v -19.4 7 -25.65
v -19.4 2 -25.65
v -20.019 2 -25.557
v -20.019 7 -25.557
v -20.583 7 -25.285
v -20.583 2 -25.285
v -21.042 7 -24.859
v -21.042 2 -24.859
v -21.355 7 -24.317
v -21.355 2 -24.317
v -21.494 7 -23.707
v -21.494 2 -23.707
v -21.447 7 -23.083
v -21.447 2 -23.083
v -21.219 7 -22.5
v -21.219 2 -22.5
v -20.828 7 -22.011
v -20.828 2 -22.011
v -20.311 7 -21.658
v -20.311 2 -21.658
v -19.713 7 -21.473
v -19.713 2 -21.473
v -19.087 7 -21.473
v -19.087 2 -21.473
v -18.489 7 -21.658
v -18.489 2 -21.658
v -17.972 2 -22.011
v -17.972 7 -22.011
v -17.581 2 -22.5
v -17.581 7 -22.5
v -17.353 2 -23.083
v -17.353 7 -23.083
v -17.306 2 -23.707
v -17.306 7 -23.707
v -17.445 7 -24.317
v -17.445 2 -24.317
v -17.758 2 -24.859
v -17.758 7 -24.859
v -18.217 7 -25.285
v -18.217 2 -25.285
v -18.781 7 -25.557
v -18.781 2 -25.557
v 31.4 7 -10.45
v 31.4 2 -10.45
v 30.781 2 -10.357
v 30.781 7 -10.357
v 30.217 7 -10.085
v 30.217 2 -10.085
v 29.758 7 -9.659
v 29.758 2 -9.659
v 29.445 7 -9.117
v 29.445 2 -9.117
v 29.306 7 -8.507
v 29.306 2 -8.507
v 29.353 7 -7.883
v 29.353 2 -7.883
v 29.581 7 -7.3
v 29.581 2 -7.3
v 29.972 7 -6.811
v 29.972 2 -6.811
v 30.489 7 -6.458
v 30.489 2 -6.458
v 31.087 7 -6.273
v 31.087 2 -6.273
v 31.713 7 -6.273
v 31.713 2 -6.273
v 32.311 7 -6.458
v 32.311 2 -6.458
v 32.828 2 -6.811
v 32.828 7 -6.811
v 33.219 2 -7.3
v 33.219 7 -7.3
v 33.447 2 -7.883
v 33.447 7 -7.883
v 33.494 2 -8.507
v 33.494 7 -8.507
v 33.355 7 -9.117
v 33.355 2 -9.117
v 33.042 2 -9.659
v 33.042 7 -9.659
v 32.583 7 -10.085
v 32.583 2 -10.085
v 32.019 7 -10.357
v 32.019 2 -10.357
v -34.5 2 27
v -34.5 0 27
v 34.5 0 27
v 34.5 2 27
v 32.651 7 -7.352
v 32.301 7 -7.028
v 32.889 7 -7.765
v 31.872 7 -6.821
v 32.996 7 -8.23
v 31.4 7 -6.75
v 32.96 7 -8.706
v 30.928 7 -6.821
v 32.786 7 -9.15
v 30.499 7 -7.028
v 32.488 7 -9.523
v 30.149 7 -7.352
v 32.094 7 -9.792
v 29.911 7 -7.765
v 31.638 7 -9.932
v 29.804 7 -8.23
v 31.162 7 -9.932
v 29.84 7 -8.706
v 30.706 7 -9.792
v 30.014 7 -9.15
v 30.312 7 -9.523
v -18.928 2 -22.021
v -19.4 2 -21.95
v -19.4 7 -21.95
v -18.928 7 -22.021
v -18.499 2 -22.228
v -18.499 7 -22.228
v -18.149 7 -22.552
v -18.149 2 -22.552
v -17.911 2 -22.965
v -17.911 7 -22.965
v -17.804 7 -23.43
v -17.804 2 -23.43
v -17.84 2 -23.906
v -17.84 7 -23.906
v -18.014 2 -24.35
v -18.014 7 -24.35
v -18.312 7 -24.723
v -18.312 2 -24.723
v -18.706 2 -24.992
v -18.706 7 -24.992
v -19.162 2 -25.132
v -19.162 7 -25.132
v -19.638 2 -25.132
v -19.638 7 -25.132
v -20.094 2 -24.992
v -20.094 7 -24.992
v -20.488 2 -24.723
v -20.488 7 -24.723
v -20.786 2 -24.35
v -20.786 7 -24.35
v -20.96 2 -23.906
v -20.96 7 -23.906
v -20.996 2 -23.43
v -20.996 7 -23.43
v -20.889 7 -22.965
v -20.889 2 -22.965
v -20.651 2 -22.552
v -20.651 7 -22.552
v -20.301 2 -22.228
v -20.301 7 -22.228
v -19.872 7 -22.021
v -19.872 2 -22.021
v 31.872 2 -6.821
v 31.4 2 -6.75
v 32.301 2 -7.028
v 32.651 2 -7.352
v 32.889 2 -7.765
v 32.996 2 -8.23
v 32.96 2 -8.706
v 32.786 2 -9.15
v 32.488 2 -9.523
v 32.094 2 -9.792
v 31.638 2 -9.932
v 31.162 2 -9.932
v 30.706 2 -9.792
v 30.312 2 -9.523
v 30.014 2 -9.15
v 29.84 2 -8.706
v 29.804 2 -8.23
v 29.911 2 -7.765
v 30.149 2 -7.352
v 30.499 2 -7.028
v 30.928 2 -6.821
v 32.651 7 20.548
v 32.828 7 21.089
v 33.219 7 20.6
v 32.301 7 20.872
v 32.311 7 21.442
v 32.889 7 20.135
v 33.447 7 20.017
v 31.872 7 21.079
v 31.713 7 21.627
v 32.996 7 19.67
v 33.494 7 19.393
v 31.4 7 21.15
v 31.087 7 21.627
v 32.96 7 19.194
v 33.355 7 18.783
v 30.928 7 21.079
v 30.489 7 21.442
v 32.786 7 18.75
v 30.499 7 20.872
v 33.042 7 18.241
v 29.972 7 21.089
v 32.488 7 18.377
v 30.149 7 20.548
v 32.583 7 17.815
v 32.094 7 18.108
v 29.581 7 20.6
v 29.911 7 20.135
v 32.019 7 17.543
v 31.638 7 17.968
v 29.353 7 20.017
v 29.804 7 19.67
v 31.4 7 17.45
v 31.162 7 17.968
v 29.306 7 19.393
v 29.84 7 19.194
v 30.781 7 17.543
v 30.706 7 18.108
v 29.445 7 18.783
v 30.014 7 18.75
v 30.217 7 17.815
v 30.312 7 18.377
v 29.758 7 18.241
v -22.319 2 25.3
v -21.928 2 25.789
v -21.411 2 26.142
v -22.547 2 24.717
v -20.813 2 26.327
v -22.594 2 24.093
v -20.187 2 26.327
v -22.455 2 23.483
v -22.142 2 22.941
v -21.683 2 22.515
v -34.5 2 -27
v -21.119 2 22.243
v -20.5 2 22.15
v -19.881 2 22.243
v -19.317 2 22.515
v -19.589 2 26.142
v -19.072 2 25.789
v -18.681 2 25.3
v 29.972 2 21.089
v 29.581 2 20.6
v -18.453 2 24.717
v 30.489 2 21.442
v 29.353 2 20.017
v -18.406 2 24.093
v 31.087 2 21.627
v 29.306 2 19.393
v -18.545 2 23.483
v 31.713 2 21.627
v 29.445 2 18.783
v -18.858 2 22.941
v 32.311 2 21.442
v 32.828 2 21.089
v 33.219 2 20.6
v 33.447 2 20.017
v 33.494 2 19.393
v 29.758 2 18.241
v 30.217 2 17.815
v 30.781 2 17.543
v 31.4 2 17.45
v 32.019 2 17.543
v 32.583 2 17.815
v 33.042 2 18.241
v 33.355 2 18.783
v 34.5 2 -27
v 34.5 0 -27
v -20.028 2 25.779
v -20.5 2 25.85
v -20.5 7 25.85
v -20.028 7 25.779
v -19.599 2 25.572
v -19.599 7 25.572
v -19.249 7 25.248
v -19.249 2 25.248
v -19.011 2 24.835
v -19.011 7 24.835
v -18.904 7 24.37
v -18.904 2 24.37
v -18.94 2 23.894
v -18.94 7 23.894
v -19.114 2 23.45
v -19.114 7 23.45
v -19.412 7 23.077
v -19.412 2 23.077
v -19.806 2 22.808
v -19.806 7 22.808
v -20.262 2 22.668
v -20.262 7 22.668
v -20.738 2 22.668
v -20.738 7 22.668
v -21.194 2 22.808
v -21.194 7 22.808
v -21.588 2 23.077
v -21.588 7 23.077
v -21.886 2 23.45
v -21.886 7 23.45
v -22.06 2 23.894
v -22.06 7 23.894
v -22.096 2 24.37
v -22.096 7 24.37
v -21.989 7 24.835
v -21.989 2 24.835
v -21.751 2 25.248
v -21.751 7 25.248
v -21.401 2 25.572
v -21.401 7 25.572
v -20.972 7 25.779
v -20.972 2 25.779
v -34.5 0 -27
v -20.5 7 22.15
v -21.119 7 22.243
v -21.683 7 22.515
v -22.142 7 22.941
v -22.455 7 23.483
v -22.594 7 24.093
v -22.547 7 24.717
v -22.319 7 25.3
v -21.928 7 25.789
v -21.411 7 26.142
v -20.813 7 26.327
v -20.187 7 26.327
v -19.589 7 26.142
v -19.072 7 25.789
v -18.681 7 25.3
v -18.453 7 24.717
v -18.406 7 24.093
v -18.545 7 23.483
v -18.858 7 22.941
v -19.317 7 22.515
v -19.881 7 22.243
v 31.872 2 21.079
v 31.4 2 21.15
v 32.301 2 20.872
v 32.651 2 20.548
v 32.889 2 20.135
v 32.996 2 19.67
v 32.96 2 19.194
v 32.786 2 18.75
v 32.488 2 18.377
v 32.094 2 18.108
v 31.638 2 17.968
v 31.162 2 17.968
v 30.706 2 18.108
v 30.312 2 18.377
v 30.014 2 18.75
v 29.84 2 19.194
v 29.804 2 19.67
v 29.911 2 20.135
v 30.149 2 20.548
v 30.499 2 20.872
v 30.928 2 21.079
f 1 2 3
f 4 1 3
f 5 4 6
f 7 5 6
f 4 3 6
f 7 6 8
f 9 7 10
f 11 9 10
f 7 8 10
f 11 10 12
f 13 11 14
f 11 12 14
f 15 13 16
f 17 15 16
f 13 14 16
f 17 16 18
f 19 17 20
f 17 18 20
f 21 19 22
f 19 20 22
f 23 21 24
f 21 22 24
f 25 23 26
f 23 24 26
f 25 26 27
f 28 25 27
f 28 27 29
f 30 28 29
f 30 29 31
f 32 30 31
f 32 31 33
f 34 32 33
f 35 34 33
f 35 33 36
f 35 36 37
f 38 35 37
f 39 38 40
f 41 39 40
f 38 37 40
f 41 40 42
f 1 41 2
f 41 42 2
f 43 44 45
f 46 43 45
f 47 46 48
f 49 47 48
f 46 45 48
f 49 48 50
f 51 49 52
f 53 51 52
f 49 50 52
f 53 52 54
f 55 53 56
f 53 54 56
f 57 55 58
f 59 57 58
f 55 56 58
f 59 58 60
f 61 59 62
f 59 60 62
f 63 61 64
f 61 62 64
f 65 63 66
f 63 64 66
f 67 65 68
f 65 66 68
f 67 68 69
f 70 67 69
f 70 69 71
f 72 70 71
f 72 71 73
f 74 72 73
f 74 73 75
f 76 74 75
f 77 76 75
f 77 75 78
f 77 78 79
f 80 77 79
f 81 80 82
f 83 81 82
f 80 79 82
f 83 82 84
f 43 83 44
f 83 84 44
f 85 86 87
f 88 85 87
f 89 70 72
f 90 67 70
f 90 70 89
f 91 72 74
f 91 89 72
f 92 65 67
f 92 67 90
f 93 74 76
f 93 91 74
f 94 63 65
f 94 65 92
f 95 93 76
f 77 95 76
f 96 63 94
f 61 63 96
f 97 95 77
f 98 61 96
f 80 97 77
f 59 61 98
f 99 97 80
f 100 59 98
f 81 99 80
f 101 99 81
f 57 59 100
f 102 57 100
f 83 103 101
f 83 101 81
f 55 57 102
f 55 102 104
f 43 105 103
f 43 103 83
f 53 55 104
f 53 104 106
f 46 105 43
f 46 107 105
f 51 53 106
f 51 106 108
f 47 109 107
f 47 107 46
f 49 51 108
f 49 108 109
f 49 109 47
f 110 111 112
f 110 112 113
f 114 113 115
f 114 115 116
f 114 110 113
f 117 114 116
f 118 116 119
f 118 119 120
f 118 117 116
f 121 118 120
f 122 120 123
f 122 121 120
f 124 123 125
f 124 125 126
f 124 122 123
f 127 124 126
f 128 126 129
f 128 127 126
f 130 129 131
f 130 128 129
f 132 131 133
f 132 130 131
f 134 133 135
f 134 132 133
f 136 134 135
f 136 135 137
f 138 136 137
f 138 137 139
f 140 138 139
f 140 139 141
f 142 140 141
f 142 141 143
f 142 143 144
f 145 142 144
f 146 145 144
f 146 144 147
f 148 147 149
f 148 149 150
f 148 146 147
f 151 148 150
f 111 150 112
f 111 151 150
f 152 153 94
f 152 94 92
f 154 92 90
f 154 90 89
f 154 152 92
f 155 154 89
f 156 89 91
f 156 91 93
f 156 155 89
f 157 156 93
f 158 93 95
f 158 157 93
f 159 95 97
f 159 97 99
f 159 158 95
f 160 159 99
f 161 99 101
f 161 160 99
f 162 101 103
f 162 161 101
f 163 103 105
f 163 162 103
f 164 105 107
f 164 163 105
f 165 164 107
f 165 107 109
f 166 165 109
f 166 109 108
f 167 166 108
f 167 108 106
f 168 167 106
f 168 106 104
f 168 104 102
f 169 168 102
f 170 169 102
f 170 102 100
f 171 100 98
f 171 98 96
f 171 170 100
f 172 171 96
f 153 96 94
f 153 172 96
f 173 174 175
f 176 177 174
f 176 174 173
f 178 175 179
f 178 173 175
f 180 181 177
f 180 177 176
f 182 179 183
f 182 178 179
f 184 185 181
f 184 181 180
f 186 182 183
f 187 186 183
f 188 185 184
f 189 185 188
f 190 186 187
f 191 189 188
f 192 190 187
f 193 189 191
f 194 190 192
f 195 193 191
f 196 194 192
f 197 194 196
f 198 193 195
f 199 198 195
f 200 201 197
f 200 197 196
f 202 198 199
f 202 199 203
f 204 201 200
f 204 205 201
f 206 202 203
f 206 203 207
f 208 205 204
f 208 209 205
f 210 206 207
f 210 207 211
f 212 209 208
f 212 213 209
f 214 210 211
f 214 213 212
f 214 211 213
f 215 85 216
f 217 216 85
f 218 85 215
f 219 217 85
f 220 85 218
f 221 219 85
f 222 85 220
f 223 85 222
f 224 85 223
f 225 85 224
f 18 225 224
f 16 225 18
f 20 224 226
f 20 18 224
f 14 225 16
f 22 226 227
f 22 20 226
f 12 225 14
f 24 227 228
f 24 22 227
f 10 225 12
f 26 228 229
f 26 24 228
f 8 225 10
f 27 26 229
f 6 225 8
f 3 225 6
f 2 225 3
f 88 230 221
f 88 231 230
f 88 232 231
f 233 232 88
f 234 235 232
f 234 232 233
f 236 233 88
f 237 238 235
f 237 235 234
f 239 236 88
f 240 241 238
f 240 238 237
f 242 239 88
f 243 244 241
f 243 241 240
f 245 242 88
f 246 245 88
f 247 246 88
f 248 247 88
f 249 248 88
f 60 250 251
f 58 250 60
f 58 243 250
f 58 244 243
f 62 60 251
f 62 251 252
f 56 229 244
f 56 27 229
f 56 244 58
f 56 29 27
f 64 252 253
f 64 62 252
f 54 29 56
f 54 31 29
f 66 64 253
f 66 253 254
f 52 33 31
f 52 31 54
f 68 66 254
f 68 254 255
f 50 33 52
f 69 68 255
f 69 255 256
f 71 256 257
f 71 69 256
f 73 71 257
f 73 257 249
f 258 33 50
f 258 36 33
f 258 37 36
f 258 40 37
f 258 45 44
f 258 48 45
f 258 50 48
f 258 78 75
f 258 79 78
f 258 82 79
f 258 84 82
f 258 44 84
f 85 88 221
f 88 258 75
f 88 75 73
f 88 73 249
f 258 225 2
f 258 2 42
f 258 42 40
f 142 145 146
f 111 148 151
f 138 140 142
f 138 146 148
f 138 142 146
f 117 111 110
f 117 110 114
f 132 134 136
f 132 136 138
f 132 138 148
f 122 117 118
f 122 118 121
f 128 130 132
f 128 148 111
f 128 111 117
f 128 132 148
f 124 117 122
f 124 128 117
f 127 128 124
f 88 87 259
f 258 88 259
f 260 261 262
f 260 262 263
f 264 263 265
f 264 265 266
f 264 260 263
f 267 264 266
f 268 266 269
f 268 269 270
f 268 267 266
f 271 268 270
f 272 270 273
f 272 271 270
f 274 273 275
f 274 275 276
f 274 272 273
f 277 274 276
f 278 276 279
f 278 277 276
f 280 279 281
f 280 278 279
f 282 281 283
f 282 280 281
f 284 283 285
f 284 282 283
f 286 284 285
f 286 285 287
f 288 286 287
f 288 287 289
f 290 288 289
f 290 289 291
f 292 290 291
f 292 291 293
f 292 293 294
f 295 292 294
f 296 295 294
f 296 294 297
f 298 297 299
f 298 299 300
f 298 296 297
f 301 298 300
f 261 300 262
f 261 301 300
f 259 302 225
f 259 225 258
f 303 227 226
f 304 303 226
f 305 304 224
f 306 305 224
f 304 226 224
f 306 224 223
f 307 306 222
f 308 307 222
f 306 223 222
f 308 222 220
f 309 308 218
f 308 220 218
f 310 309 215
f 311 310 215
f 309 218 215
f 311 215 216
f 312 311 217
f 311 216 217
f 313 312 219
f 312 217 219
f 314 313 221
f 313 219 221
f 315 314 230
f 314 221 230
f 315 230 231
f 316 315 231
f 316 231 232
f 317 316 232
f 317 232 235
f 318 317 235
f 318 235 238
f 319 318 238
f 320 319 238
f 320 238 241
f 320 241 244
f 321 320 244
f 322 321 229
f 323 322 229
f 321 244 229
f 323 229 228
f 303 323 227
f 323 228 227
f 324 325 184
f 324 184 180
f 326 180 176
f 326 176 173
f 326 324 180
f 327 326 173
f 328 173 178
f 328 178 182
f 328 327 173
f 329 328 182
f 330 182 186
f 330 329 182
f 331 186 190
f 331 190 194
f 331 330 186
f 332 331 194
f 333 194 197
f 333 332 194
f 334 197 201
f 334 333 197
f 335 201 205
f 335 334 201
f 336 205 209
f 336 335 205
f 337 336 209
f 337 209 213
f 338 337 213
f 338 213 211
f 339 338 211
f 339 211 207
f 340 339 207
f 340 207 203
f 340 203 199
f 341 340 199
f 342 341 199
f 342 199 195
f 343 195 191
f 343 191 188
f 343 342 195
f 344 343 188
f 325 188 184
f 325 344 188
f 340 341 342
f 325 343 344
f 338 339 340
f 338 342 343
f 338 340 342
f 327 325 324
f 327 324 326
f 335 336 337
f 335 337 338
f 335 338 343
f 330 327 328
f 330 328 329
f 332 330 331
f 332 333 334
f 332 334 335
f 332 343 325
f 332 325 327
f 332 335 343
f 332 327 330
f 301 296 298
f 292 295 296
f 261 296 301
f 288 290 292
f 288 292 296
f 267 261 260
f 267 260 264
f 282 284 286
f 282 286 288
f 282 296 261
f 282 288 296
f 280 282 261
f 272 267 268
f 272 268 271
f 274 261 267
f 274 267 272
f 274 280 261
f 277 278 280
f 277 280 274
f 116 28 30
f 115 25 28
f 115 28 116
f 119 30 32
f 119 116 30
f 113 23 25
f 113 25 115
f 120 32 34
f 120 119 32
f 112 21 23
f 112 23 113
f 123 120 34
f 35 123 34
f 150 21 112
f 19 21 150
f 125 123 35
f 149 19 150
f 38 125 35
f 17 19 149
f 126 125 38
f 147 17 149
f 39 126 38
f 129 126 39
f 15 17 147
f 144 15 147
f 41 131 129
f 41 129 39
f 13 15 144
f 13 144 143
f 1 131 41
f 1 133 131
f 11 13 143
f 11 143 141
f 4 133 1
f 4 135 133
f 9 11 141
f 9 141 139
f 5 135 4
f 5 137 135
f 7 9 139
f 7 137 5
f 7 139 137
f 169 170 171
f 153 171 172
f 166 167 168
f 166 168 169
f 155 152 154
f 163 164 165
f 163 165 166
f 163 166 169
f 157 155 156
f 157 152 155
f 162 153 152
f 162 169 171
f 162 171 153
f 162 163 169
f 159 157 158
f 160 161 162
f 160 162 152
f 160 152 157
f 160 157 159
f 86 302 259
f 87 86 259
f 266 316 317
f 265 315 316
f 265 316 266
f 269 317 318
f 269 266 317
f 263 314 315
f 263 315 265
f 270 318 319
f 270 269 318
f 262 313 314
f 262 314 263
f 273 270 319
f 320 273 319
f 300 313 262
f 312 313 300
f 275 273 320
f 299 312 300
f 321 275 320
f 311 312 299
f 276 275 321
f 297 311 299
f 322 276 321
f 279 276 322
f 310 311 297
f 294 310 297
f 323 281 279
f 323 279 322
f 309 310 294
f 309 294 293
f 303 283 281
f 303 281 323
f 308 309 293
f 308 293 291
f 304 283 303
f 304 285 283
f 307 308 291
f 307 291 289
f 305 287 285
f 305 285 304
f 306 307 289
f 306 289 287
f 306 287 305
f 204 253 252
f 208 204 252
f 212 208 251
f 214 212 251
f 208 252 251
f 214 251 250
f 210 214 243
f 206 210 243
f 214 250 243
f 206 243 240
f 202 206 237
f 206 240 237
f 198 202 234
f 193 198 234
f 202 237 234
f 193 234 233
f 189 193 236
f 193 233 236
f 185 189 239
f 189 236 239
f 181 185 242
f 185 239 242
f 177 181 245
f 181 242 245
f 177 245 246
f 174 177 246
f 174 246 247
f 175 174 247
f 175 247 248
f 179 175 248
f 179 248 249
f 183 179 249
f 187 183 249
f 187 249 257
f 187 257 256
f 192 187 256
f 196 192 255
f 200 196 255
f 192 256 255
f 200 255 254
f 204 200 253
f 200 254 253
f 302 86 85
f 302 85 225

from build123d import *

# Parameters (mm, degrees)
SKETCH1_W           = 69
SKETCH1_H           = 54
BOSS_EXTRUDE1_DEPTH = 2
SKETCH2_R           = 2.1
SKETCH2_R_2         = 1.6
BOSS_EXTRUDE2_DEPTH = 5


with BuildPart() as part:
    # Sketch1 → Boss-Extrude1 (new body)
    with BuildSketch(Plane(origin=(0, 0, 0), x_dir=(1, 0, 0), z_dir=(0, 1, 0))):
        Rectangle(SKETCH1_W, SKETCH1_H)
    extrude(amount=BOSS_EXTRUDE1_DEPTH)

    # Sketch2 → Boss-Extrude2 (add)
    # profile 1 of 4: a face of its own
    with BuildSketch(Plane(origin=(0, 2, 0), x_dir=(1, 0, 0), z_dir=(0, 1, 0))):
        with Locations(Location((-19.4, 23.55, 0), (0, 0, 90))):
            Circle(SKETCH2_R)
        with Locations(Location((-19.4, 23.55, 0), (0, 0, 270))):
            Circle(SKETCH2_R_2, mode=Mode.SUBTRACT)
    # profile 2 of 4: a face of its own
    with BuildSketch(Plane(origin=(0, 2, 0), x_dir=(1, 0, 0), z_dir=(0, 1, 0))):
        with Locations(Location((31.4, 8.35, 0), (0, 0, 90))):
            Circle(SKETCH2_R)
        with Locations(Location((31.4, 8.35, 0), (0, 0, 270))):
            Circle(SKETCH2_R_2, mode=Mode.SUBTRACT)
    # profile 3 of 4: a face of its own
    with BuildSketch(Plane(origin=(0, 2, 0), x_dir=(1, 0, 0), z_dir=(0, 1, 0))):
        with Locations(Location((31.4, -19.55, 0), (0, 0, 90))):
            Circle(SKETCH2_R)
        with Locations(Location((31.4, -19.55, 0), (0, 0, 270))):
            Circle(SKETCH2_R_2, mode=Mode.SUBTRACT)
    # profile 4 of 4: a face of its own
    with BuildSketch(Plane(origin=(0, 2, 0), x_dir=(1, 0, 0), z_dir=(0, 1, 0))):
        with Locations(Location((-20.5, -24.25, 0), (0, 0, 90))):
            Circle(SKETCH2_R)
        with Locations(Location((-20.5, -24.25, 0), (0, 0, 270))):
            Circle(SKETCH2_R_2, mode=Mode.SUBTRACT)
    extrude(amount=BOSS_EXTRUDE2_DEPTH)


solid = part.part
